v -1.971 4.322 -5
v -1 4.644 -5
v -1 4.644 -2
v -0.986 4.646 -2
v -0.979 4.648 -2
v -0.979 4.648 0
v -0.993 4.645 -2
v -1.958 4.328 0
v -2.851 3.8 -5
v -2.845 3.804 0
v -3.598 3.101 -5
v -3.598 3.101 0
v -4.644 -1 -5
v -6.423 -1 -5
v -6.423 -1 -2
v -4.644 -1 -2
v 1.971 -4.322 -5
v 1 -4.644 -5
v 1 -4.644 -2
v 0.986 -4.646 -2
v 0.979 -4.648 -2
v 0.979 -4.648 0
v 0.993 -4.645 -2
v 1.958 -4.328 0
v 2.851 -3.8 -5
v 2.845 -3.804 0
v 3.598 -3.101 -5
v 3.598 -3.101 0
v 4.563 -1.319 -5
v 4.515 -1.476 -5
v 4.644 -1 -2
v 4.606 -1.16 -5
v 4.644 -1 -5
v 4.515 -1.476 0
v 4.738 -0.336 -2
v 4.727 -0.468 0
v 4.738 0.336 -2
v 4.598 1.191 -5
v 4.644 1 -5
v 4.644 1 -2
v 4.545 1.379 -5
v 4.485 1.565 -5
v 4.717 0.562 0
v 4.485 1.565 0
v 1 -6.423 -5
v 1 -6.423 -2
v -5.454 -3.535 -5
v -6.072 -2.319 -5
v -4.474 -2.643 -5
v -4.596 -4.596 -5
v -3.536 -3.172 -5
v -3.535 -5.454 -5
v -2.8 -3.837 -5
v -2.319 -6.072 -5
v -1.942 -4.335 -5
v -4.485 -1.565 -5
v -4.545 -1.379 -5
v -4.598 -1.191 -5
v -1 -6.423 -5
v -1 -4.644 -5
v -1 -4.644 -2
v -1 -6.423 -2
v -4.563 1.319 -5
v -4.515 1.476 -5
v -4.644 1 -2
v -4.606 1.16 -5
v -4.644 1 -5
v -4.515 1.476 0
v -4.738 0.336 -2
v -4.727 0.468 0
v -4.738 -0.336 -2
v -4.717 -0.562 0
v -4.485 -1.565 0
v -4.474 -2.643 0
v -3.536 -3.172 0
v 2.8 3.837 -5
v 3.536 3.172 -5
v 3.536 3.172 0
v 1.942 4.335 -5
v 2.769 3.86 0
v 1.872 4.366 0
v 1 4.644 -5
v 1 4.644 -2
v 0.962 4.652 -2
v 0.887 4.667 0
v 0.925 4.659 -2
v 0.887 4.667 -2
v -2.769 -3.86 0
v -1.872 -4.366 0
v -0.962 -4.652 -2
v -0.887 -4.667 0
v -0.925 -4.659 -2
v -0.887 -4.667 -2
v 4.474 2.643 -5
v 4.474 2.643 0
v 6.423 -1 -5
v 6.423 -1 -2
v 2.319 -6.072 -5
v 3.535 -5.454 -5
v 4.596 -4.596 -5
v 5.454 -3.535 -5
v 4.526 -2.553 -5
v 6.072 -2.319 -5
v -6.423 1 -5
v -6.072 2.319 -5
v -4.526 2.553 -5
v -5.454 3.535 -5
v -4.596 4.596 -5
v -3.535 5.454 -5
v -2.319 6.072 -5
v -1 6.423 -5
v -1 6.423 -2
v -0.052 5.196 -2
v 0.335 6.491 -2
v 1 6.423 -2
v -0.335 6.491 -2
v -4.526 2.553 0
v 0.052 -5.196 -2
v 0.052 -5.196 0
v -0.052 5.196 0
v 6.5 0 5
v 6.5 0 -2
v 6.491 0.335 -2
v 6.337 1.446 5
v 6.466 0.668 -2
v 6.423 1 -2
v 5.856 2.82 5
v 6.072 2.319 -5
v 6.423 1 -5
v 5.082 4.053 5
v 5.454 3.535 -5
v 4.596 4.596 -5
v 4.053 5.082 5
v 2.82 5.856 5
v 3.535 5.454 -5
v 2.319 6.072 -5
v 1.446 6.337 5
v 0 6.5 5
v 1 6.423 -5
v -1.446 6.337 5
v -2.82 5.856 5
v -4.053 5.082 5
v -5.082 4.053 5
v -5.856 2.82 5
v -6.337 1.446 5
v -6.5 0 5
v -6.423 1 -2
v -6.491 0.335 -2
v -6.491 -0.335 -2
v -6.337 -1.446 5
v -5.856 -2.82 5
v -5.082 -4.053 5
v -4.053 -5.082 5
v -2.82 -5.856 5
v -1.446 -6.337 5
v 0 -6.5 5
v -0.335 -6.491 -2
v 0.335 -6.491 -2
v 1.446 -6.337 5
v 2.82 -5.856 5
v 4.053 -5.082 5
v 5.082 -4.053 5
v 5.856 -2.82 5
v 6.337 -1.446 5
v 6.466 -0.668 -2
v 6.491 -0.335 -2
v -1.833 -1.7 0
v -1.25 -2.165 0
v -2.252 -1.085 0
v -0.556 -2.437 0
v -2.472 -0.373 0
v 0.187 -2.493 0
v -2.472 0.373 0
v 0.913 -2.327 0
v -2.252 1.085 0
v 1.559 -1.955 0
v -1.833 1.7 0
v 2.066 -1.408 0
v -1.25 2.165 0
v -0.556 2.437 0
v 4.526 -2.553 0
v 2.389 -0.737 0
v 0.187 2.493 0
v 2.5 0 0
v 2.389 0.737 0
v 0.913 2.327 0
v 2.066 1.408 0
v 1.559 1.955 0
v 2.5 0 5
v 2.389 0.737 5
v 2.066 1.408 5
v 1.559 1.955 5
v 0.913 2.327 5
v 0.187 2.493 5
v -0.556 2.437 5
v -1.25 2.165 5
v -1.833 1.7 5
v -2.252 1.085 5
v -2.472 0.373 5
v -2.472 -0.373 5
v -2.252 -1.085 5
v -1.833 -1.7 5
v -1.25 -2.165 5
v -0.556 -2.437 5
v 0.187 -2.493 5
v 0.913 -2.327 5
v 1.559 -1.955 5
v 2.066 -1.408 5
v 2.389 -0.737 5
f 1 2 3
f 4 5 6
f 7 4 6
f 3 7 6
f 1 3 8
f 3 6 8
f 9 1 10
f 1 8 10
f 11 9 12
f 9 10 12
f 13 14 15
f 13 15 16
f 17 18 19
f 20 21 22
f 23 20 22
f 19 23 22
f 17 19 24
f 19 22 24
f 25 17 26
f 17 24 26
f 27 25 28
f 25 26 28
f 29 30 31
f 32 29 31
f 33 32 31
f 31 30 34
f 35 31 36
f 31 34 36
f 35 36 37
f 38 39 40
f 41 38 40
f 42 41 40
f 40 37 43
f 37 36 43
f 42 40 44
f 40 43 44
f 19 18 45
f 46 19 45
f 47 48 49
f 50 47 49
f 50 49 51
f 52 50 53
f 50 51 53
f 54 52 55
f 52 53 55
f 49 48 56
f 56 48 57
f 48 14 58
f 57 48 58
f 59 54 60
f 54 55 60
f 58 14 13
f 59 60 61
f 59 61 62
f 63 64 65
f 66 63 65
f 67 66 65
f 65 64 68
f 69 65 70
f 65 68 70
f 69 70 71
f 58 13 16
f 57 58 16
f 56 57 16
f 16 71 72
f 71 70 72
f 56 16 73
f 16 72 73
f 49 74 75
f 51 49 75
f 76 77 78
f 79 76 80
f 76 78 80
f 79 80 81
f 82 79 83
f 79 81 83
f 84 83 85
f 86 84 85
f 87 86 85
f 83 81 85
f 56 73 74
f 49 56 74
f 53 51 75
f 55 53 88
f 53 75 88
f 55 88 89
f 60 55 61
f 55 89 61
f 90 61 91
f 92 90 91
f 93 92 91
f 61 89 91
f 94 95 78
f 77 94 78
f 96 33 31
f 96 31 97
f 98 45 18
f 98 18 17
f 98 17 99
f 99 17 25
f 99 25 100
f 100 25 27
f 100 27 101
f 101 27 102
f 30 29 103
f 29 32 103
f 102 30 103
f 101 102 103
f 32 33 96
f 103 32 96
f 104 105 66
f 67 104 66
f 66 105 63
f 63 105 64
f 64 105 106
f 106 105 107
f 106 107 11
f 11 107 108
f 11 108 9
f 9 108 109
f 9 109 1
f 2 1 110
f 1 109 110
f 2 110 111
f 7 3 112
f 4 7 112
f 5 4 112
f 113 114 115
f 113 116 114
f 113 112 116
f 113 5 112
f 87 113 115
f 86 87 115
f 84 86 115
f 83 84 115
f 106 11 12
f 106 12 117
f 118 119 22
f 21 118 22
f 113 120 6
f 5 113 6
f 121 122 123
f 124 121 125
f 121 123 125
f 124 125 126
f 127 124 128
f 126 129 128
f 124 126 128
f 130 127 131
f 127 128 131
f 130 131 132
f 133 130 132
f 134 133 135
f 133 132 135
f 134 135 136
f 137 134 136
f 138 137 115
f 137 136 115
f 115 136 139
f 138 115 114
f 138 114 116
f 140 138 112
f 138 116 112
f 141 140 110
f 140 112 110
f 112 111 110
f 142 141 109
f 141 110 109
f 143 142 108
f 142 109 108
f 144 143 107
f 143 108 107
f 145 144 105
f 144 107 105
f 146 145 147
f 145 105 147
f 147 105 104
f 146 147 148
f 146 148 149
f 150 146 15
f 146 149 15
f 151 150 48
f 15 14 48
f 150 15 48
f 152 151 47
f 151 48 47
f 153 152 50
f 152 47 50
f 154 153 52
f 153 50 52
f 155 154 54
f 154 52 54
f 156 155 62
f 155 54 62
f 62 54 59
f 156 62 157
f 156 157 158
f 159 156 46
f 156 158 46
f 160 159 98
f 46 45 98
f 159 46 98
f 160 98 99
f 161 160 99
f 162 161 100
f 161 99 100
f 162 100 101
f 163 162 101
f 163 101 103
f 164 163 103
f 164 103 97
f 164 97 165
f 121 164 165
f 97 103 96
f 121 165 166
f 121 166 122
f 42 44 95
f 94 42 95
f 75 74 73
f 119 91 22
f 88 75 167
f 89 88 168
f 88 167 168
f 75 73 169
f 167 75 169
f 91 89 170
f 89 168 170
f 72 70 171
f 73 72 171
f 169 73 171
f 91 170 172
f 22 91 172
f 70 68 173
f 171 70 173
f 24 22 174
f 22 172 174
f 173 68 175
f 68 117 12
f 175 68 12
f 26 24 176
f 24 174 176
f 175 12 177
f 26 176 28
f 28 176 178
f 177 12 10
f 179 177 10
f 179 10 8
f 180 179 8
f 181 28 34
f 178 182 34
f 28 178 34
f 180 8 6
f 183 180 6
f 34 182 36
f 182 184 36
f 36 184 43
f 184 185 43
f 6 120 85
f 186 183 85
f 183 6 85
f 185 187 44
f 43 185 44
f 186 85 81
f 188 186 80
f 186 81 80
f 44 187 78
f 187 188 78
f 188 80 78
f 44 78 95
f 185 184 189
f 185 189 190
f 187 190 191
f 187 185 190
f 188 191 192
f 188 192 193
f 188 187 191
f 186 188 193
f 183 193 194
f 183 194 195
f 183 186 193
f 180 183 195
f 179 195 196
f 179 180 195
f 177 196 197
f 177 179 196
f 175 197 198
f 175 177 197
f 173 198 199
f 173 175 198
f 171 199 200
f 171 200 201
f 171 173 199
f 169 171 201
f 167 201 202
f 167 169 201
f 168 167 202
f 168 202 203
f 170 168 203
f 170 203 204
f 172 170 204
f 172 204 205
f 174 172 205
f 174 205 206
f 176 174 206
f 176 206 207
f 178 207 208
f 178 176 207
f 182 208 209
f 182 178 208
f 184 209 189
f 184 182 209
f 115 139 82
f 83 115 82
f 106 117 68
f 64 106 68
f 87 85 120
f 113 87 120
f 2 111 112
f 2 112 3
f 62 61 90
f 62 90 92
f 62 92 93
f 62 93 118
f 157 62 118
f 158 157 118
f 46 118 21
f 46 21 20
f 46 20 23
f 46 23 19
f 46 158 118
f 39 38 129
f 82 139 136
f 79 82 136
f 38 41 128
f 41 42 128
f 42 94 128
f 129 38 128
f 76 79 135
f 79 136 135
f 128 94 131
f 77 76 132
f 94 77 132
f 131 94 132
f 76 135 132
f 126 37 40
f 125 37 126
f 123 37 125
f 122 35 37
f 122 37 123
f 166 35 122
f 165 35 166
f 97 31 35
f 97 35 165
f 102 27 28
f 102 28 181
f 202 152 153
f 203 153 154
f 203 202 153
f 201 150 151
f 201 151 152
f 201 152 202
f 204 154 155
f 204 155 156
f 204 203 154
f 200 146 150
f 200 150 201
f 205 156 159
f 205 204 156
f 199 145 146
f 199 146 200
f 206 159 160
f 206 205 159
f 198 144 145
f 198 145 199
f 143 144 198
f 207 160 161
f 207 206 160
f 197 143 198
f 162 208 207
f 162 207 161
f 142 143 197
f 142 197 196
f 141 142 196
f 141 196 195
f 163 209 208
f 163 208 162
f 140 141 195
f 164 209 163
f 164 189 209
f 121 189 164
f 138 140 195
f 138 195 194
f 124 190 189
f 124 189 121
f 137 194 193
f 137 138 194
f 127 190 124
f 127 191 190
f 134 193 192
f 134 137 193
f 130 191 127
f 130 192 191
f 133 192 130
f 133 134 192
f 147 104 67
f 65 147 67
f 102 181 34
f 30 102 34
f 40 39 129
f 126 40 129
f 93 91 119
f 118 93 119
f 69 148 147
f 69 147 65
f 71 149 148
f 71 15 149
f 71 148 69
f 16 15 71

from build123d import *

# Parameters (mm, degrees)
F0_R     = 6.5
F0_R_2   = 4.75
F1_DEPTH = 5
F0_R_3   = 2.5
F2_DEPTH = 5
F3_W     = 1.8564560947
F3_H     = 2
F3_W_2   = 2
F3_H_2   = 1.8564560947
F4_DEPTH = 3
F6_DEPTH = 5


with BuildPart() as f1:
    # F0 (on Top) → F1 (new body)
    with BuildSketch(Plane.XY):
        Circle(F0_R)
        Circle(F0_R_2, mode=Mode.SUBTRACT)
    extrude(amount=-F1_DEPTH)

    # F0 (on Top) → F2 (join)
    with BuildSketch(Plane.XY):
        Circle(F0_R)
        Circle(F0_R_2, mode=Mode.SUBTRACT)
        Circle(F0_R_2)
        Circle(F0_R_3, mode=Mode.SUBTRACT)
    extrude(amount=F2_DEPTH)

    # F3 (on face) → F4 (cut)
    with BuildSketch(Plane(origin=(0, 0, -5), x_dir=(1, 0, 0), z_dir=(0, 0, -1))):
        with Locations((-5.5717719526, 0)):
            Rectangle(F3_W, F3_H)
        with Locations((0, -5.5717719526)):
            Rectangle(F3_W_2, F3_H_2)
        with Locations((5.5717719526, 0)):
            Rectangle(F3_W, F3_H)
        with Locations((0, 5.5717719526)):
            Rectangle(F3_W_2, F3_H_2)
    extrude(amount=-F4_DEPTH, mode=Mode.SUBTRACT)

    # F5 (on face) → F6 (cut, through all)
    with BuildSketch(Plane.XY):
        Polygon((0.0516711998, -5.1958955039), (4.5256131017, -2.5531991802), (4.4739419018, 2.6426963236), (-0.0516711998, 5.1958955039), (-4.5256131017, 2.5531991802), (-4.4739419018, -2.6426963236), align=None)
    extrude(amount=-F6_DEPTH, mode=Mode.SUBTRACT)


solid = f1.part
